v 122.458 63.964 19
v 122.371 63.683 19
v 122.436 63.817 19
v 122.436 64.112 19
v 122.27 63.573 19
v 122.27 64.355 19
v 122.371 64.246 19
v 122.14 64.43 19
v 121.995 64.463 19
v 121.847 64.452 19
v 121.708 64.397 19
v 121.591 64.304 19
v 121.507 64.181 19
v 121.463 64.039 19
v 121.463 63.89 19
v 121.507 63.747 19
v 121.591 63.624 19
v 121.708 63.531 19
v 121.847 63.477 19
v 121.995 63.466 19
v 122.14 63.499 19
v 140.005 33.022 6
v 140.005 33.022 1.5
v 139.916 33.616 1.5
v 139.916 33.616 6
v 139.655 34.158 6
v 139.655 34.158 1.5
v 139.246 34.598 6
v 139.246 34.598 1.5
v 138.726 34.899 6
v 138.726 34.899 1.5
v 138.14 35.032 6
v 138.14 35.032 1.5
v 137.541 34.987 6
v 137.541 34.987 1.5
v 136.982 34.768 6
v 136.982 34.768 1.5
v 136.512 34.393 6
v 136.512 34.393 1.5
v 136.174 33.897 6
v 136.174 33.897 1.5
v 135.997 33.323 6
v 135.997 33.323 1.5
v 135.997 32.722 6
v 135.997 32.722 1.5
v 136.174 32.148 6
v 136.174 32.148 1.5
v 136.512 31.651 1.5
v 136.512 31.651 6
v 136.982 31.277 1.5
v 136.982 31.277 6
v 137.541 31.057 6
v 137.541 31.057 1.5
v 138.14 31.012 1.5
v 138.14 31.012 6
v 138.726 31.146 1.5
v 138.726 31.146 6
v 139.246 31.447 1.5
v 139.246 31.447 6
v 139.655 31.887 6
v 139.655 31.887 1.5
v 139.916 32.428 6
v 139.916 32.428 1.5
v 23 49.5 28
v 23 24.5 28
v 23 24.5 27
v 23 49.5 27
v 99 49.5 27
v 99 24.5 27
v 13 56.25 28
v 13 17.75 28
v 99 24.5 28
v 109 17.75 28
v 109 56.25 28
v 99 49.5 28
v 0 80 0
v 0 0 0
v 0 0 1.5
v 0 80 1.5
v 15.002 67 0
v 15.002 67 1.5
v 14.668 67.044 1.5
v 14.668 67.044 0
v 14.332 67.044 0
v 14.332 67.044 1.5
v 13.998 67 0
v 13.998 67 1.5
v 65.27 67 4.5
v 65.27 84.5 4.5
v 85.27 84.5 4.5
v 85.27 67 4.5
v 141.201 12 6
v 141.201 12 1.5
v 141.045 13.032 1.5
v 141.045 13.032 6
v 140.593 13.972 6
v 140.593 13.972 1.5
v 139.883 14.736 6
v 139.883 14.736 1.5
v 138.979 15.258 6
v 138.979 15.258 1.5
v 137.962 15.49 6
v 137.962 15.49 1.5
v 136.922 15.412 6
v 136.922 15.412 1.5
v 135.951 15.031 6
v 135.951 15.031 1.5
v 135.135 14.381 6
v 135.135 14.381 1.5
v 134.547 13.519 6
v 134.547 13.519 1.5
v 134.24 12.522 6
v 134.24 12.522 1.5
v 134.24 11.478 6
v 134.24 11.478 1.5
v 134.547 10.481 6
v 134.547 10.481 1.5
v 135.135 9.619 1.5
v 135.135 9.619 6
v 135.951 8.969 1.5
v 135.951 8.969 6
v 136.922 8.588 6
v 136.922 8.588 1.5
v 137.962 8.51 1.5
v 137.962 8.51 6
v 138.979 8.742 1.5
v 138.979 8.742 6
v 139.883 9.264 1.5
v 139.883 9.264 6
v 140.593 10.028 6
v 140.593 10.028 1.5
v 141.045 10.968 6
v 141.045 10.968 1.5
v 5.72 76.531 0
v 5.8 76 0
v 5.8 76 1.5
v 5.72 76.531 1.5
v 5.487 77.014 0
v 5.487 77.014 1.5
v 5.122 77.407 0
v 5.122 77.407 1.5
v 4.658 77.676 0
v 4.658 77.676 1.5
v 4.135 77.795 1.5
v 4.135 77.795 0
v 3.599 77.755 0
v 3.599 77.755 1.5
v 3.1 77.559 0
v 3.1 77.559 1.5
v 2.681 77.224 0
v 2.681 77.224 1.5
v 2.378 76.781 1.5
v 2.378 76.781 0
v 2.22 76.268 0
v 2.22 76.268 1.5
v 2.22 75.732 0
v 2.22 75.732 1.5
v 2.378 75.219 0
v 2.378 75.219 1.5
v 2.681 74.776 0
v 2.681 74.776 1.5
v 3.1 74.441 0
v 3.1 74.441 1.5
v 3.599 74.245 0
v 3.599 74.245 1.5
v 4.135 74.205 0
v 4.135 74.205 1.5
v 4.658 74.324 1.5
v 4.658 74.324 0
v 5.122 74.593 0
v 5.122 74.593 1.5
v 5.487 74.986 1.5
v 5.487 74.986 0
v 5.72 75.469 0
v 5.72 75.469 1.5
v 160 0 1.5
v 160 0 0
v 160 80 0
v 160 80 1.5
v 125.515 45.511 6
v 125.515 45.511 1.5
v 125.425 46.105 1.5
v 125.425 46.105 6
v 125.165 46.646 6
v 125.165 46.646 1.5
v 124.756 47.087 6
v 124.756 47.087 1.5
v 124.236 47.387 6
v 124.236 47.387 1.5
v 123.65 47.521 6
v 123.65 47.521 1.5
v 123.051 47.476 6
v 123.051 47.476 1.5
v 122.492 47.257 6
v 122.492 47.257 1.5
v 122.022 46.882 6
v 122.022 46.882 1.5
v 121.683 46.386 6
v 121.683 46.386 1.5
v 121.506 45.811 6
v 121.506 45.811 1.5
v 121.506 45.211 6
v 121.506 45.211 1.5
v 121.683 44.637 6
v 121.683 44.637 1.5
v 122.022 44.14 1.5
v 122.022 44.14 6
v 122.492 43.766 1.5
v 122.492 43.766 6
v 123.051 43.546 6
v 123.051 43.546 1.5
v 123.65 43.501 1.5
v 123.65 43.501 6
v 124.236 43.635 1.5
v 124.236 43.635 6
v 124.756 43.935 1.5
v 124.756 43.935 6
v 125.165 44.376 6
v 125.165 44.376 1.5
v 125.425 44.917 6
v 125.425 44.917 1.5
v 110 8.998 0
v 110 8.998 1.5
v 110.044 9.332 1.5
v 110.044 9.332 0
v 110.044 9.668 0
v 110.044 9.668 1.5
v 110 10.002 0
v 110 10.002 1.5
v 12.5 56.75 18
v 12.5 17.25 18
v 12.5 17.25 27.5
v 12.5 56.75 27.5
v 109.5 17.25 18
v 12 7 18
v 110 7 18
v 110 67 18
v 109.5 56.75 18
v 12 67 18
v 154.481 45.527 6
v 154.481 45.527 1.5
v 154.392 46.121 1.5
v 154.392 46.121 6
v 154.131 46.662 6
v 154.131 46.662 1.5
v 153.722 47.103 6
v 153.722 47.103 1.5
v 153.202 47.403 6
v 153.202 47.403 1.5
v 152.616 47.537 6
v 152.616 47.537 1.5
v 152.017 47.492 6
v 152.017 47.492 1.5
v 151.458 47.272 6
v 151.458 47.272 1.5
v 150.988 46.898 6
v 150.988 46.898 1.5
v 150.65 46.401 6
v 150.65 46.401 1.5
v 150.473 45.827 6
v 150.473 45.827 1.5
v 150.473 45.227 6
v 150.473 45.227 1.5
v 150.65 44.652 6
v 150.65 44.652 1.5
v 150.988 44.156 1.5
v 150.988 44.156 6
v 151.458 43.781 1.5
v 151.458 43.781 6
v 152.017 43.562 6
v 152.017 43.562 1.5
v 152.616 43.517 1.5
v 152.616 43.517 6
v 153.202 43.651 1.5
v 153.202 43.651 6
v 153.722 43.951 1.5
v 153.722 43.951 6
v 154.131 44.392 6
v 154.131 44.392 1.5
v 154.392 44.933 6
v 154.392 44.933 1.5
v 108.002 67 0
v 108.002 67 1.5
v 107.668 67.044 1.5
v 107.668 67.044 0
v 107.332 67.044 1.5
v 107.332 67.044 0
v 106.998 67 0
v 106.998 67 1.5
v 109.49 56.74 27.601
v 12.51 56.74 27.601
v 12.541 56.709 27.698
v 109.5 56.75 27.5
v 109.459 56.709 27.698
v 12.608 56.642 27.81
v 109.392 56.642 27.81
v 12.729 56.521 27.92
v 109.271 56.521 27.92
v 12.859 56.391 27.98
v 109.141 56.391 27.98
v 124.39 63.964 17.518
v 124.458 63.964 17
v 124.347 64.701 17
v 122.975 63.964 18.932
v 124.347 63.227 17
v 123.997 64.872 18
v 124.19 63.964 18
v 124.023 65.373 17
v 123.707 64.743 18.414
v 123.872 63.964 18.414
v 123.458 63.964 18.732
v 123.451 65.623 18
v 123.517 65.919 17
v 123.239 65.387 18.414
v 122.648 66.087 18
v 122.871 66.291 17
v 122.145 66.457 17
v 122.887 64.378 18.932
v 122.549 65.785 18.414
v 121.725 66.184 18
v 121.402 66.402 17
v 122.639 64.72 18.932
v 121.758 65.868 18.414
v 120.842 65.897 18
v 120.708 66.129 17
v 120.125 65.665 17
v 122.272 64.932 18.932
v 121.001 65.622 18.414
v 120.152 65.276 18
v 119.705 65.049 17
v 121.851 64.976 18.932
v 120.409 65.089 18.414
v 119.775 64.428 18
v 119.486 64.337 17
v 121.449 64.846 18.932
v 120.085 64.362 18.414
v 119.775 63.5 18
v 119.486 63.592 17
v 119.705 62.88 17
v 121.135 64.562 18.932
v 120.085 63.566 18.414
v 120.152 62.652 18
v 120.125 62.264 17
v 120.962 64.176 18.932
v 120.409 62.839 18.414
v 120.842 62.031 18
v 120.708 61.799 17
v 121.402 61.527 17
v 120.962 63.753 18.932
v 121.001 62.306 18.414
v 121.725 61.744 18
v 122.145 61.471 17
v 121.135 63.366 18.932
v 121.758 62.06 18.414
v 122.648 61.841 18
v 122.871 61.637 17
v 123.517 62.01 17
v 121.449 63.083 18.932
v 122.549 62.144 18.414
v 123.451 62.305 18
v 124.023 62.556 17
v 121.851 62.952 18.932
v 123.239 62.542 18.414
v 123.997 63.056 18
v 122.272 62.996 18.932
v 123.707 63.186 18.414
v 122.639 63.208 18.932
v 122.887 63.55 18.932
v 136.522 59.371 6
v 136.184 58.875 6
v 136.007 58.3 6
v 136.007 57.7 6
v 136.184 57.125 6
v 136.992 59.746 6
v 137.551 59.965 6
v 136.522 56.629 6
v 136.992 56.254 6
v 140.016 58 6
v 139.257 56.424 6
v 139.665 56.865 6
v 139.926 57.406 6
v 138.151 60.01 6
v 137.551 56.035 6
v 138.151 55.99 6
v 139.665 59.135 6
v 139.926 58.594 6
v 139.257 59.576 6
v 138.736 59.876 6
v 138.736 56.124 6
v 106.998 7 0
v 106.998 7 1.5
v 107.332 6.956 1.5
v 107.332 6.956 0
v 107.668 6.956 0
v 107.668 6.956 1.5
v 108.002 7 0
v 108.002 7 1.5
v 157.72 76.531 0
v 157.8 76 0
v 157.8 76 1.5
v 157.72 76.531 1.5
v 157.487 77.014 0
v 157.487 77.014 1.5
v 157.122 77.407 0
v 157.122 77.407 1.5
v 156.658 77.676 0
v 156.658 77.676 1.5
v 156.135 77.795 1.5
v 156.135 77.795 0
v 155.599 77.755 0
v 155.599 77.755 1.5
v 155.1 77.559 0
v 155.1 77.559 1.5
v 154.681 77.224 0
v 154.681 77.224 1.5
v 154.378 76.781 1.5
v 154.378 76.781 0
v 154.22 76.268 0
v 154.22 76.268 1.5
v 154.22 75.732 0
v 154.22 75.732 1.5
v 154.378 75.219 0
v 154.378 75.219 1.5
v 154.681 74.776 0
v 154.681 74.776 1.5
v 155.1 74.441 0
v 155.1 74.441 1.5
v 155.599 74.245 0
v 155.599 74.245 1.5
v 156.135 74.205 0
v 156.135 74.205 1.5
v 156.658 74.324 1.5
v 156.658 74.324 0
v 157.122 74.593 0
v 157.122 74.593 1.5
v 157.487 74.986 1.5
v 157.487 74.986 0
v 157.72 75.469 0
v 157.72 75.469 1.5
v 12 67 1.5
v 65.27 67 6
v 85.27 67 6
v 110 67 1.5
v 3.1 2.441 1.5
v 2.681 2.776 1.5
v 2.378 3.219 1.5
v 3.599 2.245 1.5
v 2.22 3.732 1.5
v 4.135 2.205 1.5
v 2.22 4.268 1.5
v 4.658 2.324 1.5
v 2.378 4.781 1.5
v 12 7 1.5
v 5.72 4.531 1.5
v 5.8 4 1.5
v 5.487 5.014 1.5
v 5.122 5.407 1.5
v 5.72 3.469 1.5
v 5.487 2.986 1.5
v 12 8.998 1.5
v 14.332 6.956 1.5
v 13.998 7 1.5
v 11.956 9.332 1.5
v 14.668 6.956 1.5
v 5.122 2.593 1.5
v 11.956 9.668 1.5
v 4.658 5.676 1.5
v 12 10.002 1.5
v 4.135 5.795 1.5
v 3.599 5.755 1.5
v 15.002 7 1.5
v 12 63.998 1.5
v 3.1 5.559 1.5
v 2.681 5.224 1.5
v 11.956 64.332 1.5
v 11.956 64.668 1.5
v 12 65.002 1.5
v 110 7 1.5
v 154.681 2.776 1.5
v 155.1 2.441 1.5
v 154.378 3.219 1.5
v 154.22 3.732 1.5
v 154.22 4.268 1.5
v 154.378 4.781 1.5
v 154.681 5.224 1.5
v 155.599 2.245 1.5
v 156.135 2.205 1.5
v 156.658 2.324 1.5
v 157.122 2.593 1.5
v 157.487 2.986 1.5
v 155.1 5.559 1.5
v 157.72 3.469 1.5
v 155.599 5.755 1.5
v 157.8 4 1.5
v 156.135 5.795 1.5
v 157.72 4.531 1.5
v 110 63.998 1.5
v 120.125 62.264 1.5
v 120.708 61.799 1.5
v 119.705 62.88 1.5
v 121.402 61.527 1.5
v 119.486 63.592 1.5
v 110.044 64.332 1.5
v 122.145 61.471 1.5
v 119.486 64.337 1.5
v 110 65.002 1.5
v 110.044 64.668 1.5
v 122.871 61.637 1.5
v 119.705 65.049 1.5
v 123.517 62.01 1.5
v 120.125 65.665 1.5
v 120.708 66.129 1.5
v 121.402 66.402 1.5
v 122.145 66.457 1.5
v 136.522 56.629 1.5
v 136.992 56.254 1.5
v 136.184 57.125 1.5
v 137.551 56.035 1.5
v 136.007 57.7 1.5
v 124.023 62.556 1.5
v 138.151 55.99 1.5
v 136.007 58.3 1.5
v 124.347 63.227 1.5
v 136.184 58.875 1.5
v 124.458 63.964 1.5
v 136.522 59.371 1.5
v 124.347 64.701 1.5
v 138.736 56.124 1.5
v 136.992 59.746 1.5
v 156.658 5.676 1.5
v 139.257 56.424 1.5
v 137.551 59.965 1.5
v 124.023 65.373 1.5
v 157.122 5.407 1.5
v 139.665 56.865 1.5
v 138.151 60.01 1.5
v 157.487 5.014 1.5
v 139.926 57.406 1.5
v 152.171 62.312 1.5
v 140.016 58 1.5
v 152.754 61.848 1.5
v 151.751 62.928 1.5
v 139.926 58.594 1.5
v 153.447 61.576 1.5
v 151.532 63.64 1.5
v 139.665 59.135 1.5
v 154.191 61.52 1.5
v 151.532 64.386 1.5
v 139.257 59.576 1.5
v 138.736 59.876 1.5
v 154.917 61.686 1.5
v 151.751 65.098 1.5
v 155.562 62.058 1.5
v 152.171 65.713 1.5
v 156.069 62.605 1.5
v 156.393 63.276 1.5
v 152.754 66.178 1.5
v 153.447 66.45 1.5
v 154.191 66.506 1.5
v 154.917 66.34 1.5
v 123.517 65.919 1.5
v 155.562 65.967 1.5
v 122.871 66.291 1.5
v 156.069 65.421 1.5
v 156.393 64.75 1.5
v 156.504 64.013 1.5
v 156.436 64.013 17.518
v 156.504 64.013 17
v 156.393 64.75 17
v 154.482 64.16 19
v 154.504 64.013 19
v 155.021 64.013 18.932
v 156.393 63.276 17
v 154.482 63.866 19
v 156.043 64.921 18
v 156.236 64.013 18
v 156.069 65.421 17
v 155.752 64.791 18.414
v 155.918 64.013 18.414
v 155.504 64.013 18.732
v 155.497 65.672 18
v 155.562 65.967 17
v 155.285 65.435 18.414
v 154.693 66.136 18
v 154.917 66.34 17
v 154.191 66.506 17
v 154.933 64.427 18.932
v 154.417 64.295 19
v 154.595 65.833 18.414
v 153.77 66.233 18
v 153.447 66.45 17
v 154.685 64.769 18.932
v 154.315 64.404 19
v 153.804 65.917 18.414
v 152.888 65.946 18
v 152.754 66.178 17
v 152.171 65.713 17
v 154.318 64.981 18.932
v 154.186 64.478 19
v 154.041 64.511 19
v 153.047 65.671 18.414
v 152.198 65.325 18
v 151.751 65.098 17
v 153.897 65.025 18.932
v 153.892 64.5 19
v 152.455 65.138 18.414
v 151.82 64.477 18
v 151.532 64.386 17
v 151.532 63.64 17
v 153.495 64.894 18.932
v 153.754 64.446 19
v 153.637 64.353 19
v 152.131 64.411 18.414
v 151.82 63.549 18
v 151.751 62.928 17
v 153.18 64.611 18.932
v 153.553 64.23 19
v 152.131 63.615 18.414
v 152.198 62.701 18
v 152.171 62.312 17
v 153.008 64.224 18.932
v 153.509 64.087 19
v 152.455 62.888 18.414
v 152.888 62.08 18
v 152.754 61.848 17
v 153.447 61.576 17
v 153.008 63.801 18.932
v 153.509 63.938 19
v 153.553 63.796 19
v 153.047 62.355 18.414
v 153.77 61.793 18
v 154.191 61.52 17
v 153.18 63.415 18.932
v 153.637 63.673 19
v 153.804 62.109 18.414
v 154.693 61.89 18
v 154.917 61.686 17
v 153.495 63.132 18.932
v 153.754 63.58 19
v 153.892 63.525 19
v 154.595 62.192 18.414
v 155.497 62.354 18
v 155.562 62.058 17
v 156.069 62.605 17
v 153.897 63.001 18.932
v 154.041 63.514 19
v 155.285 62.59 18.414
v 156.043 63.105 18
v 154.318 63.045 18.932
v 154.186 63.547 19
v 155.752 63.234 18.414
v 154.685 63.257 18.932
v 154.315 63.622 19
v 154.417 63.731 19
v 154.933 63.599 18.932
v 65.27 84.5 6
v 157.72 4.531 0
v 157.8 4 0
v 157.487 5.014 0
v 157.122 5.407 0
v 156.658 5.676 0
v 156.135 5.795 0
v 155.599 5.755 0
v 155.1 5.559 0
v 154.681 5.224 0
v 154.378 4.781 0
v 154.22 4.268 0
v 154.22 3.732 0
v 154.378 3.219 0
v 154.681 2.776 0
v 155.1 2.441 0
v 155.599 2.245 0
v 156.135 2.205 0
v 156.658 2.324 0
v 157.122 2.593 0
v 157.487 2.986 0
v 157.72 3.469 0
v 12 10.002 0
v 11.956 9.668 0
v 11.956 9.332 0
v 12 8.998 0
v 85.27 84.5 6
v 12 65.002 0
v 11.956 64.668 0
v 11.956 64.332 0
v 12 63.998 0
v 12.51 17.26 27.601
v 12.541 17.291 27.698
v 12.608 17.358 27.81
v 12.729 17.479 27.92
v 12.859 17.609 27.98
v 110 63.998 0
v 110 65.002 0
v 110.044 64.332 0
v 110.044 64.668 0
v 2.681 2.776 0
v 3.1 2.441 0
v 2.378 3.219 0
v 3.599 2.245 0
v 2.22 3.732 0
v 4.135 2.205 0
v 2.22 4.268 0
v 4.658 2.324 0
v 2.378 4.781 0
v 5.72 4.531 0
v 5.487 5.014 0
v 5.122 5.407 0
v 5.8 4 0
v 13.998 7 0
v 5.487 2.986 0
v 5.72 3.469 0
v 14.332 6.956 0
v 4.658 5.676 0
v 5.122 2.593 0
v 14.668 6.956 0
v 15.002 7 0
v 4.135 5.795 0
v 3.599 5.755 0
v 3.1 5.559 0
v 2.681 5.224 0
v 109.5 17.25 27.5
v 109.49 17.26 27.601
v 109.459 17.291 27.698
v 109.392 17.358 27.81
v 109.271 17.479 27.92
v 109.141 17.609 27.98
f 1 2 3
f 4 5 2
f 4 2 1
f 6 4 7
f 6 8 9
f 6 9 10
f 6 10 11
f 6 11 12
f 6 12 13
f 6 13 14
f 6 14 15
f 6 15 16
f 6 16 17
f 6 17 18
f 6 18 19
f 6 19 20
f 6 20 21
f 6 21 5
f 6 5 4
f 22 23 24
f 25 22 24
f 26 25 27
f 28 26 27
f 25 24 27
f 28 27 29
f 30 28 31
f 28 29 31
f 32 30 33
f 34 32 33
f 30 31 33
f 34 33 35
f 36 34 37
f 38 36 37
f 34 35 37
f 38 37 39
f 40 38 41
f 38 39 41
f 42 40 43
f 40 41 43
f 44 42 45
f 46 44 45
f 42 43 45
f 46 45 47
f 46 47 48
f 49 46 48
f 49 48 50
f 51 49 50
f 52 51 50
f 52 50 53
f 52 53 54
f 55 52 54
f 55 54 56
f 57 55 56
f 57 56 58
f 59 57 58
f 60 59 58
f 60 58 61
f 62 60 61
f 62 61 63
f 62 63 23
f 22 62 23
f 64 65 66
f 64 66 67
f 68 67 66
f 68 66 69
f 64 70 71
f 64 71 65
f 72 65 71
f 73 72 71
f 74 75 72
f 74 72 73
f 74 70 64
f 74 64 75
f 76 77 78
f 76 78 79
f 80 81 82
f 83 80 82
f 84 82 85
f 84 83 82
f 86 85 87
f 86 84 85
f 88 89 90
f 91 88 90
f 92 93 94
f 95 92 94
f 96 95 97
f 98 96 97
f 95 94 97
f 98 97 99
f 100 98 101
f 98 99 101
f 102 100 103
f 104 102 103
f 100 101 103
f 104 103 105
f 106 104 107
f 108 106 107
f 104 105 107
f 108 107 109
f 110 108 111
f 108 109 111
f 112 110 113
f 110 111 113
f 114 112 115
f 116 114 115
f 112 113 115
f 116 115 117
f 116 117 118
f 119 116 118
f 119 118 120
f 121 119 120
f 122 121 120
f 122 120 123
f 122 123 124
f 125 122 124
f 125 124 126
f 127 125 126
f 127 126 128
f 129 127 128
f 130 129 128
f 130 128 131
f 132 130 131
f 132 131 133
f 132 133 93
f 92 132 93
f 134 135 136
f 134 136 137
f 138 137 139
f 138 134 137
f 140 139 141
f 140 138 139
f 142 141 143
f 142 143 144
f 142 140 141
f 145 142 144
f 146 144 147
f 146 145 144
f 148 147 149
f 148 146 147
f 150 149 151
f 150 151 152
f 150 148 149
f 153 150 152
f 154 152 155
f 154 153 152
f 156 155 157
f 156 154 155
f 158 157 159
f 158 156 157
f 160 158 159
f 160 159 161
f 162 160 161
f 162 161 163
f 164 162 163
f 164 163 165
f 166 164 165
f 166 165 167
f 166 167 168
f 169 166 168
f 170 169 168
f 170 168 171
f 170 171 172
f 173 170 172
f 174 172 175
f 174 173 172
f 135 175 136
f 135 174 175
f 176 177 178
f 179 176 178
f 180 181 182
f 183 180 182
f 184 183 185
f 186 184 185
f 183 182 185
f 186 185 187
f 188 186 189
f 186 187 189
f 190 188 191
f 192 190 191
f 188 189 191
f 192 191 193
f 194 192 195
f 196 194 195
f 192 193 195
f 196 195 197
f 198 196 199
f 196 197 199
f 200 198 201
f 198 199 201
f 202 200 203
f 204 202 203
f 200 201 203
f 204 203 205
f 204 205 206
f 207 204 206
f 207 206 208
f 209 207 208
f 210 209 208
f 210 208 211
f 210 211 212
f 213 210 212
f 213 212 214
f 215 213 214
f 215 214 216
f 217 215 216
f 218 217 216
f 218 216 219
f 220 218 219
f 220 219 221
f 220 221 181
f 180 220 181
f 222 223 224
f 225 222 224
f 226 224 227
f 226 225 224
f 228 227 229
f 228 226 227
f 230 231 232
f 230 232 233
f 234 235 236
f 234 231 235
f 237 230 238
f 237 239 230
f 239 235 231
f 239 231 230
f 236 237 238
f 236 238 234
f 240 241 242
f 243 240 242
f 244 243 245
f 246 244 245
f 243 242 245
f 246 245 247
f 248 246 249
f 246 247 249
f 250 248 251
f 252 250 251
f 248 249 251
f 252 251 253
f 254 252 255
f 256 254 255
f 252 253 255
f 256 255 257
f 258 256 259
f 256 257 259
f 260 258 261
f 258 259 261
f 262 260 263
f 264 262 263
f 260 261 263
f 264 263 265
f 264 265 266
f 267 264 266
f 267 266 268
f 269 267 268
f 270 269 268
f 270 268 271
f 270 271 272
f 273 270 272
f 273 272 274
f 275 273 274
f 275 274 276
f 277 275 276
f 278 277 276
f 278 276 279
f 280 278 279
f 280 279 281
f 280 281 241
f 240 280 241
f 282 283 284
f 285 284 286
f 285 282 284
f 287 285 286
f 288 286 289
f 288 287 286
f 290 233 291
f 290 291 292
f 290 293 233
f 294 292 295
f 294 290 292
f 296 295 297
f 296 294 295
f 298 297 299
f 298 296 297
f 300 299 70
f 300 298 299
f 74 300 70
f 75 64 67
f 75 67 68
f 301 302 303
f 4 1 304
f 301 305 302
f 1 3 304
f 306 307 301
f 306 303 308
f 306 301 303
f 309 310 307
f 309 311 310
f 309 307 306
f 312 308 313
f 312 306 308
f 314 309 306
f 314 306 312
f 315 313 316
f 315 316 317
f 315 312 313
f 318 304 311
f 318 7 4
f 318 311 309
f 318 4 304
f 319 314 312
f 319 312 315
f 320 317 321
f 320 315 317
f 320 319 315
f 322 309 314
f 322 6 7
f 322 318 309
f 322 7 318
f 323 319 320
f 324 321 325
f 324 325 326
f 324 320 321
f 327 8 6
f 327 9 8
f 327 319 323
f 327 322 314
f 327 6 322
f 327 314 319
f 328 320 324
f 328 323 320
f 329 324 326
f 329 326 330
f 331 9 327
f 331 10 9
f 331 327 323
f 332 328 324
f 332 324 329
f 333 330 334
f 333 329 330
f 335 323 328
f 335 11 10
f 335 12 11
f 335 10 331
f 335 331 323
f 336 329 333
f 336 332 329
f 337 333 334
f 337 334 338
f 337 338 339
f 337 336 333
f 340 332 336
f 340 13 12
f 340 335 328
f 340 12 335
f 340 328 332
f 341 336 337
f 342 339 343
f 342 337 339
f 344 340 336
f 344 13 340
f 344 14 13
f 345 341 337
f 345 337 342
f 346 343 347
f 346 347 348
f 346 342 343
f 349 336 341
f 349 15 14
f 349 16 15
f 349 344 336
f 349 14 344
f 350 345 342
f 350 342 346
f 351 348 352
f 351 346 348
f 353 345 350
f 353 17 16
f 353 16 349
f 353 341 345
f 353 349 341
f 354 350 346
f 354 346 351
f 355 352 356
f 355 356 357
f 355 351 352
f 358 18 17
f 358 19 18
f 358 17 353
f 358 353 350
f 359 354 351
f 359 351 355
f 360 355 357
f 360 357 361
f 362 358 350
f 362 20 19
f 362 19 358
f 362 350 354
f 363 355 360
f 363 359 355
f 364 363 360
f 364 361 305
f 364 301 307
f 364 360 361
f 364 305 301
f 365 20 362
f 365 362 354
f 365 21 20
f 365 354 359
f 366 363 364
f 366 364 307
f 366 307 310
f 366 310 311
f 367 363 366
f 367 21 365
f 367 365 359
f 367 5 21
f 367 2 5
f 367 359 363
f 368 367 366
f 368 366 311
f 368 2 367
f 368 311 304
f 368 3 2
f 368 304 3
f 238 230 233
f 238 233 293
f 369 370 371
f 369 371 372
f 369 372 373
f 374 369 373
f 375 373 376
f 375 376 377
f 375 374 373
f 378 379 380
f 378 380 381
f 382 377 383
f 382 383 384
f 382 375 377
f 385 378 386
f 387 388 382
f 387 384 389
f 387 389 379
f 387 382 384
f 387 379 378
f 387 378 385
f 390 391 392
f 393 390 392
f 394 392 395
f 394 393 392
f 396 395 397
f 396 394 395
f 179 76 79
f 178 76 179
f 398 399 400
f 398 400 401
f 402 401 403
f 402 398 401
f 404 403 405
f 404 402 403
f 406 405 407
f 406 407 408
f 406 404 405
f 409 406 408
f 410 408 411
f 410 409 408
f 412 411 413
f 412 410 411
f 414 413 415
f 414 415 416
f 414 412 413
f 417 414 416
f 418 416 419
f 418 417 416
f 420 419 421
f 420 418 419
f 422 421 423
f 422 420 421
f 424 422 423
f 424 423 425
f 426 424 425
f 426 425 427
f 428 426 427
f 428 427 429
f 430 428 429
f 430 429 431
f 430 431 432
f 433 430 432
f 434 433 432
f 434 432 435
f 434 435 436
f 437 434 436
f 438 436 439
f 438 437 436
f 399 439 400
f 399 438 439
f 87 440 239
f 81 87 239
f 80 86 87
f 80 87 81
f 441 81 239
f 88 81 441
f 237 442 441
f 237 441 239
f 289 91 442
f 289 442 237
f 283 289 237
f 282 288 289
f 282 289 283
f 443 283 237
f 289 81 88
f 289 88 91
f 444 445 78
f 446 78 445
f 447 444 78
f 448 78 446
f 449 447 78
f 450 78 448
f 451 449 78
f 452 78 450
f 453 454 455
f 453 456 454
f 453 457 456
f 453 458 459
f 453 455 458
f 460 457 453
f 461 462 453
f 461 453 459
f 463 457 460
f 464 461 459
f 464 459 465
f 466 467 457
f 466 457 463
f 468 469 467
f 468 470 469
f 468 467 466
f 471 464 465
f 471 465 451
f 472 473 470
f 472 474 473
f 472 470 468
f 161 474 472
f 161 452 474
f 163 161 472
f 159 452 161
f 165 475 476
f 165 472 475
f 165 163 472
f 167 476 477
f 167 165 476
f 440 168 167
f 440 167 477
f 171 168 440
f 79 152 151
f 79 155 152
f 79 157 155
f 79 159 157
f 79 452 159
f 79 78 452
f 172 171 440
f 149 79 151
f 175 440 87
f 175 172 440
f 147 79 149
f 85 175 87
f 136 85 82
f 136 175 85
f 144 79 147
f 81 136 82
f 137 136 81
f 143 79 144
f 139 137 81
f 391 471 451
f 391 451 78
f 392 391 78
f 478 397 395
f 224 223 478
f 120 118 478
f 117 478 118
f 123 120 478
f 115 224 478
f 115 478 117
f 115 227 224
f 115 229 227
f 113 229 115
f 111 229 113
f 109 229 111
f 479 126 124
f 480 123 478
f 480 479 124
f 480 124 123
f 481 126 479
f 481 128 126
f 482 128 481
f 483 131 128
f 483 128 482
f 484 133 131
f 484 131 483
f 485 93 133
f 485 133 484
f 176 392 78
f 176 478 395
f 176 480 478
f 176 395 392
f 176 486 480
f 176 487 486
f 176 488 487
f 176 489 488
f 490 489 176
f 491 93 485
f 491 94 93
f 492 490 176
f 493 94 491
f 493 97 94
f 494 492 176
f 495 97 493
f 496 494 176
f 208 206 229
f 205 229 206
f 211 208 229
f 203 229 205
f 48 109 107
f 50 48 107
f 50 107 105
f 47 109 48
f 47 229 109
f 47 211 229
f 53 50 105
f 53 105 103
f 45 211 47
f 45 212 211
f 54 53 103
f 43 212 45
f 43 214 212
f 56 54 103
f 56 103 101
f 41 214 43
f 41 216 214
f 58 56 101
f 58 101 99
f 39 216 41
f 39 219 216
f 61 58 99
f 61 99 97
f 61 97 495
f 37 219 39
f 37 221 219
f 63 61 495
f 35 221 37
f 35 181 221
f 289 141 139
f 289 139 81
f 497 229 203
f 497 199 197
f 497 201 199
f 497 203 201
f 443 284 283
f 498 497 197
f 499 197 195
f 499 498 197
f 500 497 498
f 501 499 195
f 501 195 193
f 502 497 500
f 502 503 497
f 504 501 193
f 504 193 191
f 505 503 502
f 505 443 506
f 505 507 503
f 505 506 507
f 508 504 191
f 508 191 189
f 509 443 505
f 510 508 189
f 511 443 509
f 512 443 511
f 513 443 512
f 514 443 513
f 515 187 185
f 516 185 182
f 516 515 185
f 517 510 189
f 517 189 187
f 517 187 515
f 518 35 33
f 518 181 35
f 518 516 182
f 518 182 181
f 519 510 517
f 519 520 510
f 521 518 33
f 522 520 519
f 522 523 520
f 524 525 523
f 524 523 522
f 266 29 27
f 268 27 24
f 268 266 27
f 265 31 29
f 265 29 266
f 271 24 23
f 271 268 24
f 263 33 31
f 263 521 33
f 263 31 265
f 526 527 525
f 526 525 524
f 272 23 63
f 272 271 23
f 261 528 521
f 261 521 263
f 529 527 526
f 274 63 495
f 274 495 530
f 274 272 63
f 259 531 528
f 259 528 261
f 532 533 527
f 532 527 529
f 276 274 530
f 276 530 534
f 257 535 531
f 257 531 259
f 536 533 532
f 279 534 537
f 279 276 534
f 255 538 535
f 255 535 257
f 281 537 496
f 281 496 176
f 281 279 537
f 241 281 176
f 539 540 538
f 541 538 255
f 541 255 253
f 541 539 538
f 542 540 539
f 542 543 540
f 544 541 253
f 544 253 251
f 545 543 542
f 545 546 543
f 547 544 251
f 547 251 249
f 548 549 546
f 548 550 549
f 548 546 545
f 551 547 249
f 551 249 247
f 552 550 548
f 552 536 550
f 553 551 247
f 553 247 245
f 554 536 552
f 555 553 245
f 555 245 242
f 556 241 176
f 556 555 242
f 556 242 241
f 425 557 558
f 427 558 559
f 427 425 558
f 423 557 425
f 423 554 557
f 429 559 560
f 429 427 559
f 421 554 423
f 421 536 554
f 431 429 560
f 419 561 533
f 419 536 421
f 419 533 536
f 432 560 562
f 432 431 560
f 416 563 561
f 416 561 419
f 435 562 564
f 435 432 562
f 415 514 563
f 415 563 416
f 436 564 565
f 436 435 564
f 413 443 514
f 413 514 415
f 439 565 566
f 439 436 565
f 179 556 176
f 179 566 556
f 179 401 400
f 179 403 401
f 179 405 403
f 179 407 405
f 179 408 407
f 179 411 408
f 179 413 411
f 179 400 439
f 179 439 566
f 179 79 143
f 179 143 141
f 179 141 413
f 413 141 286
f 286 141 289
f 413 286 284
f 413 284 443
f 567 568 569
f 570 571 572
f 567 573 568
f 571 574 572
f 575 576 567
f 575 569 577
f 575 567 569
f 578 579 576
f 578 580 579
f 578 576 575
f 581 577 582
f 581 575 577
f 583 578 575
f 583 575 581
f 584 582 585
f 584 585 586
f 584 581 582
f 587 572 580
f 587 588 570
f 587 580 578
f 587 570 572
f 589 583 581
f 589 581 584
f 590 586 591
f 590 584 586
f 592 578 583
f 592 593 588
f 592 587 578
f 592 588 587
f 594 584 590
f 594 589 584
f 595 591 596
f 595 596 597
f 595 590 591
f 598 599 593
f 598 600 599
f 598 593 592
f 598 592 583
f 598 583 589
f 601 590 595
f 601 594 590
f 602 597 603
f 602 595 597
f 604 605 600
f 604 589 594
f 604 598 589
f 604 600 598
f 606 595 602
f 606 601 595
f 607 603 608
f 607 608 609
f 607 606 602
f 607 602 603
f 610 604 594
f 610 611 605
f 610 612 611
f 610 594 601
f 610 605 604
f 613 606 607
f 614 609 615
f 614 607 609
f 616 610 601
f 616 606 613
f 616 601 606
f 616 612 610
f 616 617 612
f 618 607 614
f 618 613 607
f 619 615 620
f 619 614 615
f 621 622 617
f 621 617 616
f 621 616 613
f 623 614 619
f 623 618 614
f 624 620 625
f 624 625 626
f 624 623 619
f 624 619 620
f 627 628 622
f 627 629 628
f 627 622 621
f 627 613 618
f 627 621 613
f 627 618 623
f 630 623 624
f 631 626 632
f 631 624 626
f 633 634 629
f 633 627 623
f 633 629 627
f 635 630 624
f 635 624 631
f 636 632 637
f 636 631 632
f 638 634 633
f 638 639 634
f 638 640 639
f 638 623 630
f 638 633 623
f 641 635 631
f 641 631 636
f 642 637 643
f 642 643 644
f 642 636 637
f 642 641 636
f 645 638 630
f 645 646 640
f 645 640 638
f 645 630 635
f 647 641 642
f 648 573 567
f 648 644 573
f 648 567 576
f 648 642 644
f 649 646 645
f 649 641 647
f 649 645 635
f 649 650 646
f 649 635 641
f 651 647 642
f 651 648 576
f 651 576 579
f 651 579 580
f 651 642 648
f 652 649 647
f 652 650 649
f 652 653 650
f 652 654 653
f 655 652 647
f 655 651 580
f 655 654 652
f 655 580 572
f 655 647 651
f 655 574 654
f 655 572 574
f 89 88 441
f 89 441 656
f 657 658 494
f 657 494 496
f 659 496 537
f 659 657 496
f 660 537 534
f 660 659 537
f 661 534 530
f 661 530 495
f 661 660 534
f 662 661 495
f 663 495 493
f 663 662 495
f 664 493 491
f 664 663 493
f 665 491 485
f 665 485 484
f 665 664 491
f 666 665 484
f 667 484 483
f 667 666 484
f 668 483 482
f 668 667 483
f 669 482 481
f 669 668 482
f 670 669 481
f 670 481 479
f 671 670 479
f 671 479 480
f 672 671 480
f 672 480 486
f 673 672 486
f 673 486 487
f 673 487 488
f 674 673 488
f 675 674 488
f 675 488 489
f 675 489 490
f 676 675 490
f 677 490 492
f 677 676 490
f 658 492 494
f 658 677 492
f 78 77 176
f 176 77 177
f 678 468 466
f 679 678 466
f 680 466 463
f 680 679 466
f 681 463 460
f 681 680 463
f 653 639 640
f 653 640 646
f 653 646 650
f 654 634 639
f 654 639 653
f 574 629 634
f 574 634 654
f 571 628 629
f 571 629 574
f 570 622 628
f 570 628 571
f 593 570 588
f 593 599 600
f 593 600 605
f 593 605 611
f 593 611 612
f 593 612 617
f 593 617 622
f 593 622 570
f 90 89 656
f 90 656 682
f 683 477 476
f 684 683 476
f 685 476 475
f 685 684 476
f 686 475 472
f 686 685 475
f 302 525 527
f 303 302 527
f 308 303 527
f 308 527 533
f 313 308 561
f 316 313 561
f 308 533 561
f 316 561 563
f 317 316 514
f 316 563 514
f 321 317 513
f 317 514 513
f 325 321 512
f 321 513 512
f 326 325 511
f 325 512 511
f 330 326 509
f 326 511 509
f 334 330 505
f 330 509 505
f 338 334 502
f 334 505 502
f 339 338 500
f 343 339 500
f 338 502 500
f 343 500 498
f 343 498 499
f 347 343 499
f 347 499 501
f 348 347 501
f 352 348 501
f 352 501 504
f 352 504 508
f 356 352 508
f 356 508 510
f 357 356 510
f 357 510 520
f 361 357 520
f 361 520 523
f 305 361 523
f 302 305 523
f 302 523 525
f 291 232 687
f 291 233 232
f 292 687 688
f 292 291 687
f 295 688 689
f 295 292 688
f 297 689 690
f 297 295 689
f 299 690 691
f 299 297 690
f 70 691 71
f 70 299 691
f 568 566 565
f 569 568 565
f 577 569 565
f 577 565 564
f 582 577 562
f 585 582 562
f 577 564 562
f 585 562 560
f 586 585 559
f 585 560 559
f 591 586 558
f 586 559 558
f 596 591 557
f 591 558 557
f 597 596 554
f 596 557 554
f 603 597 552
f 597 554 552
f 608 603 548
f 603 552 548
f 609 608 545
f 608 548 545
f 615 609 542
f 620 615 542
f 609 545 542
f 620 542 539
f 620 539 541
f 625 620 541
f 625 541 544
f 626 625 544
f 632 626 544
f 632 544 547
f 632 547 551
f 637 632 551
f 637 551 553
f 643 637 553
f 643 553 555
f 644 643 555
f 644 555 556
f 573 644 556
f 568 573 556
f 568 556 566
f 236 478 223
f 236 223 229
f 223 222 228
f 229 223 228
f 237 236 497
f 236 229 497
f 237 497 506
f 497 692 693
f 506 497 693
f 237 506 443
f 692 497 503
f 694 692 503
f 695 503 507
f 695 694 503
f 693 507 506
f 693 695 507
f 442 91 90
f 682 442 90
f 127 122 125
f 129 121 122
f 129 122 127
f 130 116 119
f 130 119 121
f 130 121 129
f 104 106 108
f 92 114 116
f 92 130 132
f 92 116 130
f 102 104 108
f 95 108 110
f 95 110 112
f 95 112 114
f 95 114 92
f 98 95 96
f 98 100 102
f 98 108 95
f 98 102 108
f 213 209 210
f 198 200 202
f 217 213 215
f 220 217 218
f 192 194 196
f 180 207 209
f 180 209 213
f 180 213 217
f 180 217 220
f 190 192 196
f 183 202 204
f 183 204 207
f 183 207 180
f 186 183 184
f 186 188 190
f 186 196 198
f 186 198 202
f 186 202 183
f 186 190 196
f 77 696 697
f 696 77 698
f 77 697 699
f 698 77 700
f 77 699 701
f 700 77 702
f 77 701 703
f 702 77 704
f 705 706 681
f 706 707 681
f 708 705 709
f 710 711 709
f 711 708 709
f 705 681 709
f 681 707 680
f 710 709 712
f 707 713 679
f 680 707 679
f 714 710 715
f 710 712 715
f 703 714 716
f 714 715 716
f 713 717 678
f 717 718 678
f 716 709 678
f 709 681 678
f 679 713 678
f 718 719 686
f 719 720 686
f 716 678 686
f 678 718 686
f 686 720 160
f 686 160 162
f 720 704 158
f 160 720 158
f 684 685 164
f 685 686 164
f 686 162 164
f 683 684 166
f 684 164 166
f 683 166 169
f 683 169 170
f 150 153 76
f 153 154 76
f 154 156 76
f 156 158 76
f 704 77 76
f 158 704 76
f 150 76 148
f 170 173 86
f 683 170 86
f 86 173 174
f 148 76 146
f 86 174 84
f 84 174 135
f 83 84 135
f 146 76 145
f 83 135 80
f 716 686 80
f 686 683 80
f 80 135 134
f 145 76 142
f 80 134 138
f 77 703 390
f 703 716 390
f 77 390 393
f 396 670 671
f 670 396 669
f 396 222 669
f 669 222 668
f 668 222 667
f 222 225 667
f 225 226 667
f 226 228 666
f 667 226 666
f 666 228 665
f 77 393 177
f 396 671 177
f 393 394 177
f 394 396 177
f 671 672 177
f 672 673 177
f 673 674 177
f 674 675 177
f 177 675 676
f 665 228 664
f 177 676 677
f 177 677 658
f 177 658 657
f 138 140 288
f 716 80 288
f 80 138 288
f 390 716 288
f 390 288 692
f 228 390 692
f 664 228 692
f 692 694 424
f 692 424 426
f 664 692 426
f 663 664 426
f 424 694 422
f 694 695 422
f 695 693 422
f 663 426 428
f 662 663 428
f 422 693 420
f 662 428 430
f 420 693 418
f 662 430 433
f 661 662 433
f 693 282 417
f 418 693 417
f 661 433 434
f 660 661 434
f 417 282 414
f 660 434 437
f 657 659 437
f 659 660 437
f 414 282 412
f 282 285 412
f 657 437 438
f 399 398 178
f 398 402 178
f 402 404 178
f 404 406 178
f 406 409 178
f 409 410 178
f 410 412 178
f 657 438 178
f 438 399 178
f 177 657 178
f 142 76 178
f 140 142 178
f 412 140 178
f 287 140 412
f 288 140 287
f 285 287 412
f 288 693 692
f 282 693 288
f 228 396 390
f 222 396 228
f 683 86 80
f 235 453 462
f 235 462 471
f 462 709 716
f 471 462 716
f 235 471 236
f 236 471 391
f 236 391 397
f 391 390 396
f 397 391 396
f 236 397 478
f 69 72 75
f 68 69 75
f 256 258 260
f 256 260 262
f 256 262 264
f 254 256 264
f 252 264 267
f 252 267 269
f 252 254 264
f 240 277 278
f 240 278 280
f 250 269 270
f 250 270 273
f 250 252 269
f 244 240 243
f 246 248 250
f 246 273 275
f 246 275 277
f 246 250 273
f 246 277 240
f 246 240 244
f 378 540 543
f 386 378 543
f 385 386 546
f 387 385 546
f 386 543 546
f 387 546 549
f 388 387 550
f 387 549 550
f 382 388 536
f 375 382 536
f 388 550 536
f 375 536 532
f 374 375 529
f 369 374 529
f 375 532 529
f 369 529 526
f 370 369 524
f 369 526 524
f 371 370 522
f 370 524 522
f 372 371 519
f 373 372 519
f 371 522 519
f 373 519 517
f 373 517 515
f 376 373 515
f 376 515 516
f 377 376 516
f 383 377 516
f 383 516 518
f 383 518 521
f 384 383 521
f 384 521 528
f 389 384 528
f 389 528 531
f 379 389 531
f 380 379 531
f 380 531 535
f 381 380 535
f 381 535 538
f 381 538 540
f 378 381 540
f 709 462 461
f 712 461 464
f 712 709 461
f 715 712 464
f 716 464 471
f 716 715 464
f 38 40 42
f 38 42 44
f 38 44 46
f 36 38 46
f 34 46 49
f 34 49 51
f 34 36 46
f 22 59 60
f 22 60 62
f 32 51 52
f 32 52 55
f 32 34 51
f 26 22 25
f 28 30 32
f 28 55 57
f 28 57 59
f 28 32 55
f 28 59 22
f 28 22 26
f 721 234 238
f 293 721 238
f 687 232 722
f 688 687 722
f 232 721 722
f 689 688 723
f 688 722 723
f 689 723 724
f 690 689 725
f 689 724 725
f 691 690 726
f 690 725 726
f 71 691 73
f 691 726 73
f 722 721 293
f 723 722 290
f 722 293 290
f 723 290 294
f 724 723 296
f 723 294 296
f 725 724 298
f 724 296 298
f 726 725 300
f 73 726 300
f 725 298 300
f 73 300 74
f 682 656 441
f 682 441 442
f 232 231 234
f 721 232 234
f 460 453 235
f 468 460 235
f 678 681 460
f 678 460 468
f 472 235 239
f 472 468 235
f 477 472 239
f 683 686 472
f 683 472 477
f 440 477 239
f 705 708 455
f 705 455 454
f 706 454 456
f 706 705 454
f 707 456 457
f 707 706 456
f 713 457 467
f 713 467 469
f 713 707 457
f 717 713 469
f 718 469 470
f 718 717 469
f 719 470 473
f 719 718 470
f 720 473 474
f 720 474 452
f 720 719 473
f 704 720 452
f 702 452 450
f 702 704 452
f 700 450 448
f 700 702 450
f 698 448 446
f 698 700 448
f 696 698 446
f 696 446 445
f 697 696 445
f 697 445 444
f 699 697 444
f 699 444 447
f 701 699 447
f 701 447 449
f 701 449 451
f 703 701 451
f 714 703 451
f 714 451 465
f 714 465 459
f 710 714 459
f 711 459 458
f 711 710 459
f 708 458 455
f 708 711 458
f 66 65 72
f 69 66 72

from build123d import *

# Parameters (mm, degrees)
MODEL_W                     = 160
MODEL_H                     = 80
MODEL_R                     = 2.55
MODEL_R_2                   = 1.8
MODEL_R_3                   = 2.5
MODEL_R_4                   = 3.5
MODEL_R_5                   = 2.015564
DODANIE_WYCI_GNI_CIE1_DEPTH = 1.5
MODEL_3_R                   = 2.015564
MODEL_3_R_2                 = 3.5
DODANIE_WYCI_GNI_CIE2_DEPTH = 6
MODEL_4_R                   = 2.5
DODANIE_WYCI_GNI_CIE3_DEPTH = 19
ZAOKR_GLENIE1_R             = 2
MODEL_5_W                   = 98
MODEL_5_H                   = 60
DODANIE_WYCI_GNI_CIE4_DEPTH = 18
MODEL_6_W                   = 97
MODEL_6_H                   = 39.5
DODANIE_WYCI_GNI_CIE5_DEPTH = 28
SZKIC2_W                    = 76
SZKIC2_H                    = 25
WYTNIJ_WYCI_GNI_CIE1_DEPTH  = 1
ZAOKR_GLENIE2_R             = 0.5
DODANIE_WYCI_GNI_CIE6_START = 3
SZKIC3_W                    = 20
SZKIC3_H                    = 33.5
DODANIE_WYCI_GNI_CIE6_DEPTH = 1.5


with BuildPart() as part:
    # Model → Dodanie-wyci_gni_cie1 (new body)
    with BuildSketch(Plane.XY):
        with Locations((80, 40)):
            Rectangle(MODEL_W, MODEL_H)
        with Locations((14.5, 64.5)):
            Circle(MODEL_R, mode=Mode.SUBTRACT)
        with Locations((4, 4)):
            Circle(MODEL_R_2, mode=Mode.SUBTRACT)
        with Locations((154.00374, 64.012896)):
            Circle(MODEL_R_3, mode=Mode.SUBTRACT)
        with Locations((14.5, 9.5)):
            Circle(MODEL_R, mode=Mode.SUBTRACT)
        with Locations((107.5, 9.5)):
            Circle(MODEL_R, mode=Mode.SUBTRACT)
        with Locations((107.5, 64.5)):
            Circle(MODEL_R, mode=Mode.SUBTRACT)
        with Locations((156, 76)):
            Circle(MODEL_R_2, mode=Mode.SUBTRACT)
        with Locations((156, 4)):
            Circle(MODEL_R_2, mode=Mode.SUBTRACT)
        with Locations((137.7008, 12)):
            Circle(MODEL_R_4, mode=Mode.SUBTRACT)
        with Locations((137.989674, 33.022353)):
            Circle(MODEL_R_5, mode=Mode.SUBTRACT)
        with Locations((4, 76)):
            Circle(MODEL_R_2, mode=Mode.SUBTRACT)
        with Locations((123.499421, 45.511083)):
            Circle(MODEL_R_5, mode=Mode.SUBTRACT)
        with Locations((152.465613, 45.526919)):
            Circle(MODEL_R_5, mode=Mode.SUBTRACT)
        with Locations((138, 58)):
            Circle(MODEL_R_5, mode=Mode.SUBTRACT)
        with Locations((121.957824, 63.96421)):
            Circle(MODEL_R_3, mode=Mode.SUBTRACT)
        Polygon((109.5, 56.75), (109.5, 17.25), (12.5, 17.25), (12.5, 56.75), (70.19, 56.75), (70.19, 57.27), (79.715, 57.27), (80.235, 56.75), align=None, mode=Mode.SUBTRACT)
    extrude(amount=DODANIE_WYCI_GNI_CIE1_DEPTH)

    # Model_3 → Dodanie-wyci_gni_cie2 (add)
    with BuildSketch(Plane.XY):
        with Locations((138, 58)):
            Circle(MODEL_3_R)
        with Locations((123.499421, 45.511083)):
            Circle(MODEL_3_R)
        with Locations((152.465613, 45.526919)):
            Circle(MODEL_3_R)
        with Locations((137.7008, 12)):
            Circle(MODEL_3_R_2)
        with Locations((137.989674, 33.022353)):
            Circle(MODEL_3_R)
    extrude(amount=DODANIE_WYCI_GNI_CIE2_DEPTH)

    # Model_4 → Dodanie-wyci_gni_cie3 (add)
    with BuildSketch(Plane.XY):
        with Locations((121.957824, 63.96421)):
            Circle(MODEL_4_R)
        with Locations((154.00374, 64.012896)):
            Circle(MODEL_4_R)
    extrude(amount=DODANIE_WYCI_GNI_CIE3_DEPTH)

    # Zaokr_glenie1
    zaokr_glenie1_edges = [part.edges().sort_by_distance(p)[0] for p in [
        (119.457824, 63.96421, 19),
        (151.50374, 64.012896, 19),
    ]]
    fillet(zaokr_glenie1_edges, radius=ZAOKR_GLENIE1_R)

    # Model_5 → Dodanie-wyci_gni_cie4 (add)
    with BuildSketch(Plane.XY):
        with Locations((61, 37)):
            Rectangle(MODEL_5_W, MODEL_5_H)
    extrude(amount=DODANIE_WYCI_GNI_CIE4_DEPTH)

    # Model_6 → Dodanie-wyci_gni_cie5 (add)
    with BuildSketch(Plane.XY):
        with Locations((61, 37)):
            Rectangle(MODEL_6_W, MODEL_6_H)
    extrude(amount=DODANIE_WYCI_GNI_CIE5_DEPTH)

    # Szkic2 → Wytnij-wyci_gni_cie1 (cut)
    with BuildSketch(Plane.XY.offset(28)):
        with Locations((61, 37)):
            Rectangle(SZKIC2_W, SZKIC2_H)
    extrude(amount=-WYTNIJ_WYCI_GNI_CIE1_DEPTH, mode=Mode.SUBTRACT)

    # Zaokr_glenie2
    zaokr_glenie2_edges = [part.edges().sort_by_distance(p)[0] for p in [
        (12.5, 37, 28),
        (61, 17.25, 28),
        (109.5, 37, 28),
        (61, 56.75, 28),
    ]]
    fillet(zaokr_glenie2_edges, radius=ZAOKR_GLENIE2_R)

    # Szkic3 → Dodanie-wyci_gni_cie6 (add)
    with BuildSketch(Plane.XY.offset(1.5).offset(DODANIE_WYCI_GNI_CIE6_START)):
        with Locations((75.27, 67.75)):
            Rectangle(SZKIC3_W, SZKIC3_H)
    extrude(amount=DODANIE_WYCI_GNI_CIE6_DEPTH)


solid = part.part
